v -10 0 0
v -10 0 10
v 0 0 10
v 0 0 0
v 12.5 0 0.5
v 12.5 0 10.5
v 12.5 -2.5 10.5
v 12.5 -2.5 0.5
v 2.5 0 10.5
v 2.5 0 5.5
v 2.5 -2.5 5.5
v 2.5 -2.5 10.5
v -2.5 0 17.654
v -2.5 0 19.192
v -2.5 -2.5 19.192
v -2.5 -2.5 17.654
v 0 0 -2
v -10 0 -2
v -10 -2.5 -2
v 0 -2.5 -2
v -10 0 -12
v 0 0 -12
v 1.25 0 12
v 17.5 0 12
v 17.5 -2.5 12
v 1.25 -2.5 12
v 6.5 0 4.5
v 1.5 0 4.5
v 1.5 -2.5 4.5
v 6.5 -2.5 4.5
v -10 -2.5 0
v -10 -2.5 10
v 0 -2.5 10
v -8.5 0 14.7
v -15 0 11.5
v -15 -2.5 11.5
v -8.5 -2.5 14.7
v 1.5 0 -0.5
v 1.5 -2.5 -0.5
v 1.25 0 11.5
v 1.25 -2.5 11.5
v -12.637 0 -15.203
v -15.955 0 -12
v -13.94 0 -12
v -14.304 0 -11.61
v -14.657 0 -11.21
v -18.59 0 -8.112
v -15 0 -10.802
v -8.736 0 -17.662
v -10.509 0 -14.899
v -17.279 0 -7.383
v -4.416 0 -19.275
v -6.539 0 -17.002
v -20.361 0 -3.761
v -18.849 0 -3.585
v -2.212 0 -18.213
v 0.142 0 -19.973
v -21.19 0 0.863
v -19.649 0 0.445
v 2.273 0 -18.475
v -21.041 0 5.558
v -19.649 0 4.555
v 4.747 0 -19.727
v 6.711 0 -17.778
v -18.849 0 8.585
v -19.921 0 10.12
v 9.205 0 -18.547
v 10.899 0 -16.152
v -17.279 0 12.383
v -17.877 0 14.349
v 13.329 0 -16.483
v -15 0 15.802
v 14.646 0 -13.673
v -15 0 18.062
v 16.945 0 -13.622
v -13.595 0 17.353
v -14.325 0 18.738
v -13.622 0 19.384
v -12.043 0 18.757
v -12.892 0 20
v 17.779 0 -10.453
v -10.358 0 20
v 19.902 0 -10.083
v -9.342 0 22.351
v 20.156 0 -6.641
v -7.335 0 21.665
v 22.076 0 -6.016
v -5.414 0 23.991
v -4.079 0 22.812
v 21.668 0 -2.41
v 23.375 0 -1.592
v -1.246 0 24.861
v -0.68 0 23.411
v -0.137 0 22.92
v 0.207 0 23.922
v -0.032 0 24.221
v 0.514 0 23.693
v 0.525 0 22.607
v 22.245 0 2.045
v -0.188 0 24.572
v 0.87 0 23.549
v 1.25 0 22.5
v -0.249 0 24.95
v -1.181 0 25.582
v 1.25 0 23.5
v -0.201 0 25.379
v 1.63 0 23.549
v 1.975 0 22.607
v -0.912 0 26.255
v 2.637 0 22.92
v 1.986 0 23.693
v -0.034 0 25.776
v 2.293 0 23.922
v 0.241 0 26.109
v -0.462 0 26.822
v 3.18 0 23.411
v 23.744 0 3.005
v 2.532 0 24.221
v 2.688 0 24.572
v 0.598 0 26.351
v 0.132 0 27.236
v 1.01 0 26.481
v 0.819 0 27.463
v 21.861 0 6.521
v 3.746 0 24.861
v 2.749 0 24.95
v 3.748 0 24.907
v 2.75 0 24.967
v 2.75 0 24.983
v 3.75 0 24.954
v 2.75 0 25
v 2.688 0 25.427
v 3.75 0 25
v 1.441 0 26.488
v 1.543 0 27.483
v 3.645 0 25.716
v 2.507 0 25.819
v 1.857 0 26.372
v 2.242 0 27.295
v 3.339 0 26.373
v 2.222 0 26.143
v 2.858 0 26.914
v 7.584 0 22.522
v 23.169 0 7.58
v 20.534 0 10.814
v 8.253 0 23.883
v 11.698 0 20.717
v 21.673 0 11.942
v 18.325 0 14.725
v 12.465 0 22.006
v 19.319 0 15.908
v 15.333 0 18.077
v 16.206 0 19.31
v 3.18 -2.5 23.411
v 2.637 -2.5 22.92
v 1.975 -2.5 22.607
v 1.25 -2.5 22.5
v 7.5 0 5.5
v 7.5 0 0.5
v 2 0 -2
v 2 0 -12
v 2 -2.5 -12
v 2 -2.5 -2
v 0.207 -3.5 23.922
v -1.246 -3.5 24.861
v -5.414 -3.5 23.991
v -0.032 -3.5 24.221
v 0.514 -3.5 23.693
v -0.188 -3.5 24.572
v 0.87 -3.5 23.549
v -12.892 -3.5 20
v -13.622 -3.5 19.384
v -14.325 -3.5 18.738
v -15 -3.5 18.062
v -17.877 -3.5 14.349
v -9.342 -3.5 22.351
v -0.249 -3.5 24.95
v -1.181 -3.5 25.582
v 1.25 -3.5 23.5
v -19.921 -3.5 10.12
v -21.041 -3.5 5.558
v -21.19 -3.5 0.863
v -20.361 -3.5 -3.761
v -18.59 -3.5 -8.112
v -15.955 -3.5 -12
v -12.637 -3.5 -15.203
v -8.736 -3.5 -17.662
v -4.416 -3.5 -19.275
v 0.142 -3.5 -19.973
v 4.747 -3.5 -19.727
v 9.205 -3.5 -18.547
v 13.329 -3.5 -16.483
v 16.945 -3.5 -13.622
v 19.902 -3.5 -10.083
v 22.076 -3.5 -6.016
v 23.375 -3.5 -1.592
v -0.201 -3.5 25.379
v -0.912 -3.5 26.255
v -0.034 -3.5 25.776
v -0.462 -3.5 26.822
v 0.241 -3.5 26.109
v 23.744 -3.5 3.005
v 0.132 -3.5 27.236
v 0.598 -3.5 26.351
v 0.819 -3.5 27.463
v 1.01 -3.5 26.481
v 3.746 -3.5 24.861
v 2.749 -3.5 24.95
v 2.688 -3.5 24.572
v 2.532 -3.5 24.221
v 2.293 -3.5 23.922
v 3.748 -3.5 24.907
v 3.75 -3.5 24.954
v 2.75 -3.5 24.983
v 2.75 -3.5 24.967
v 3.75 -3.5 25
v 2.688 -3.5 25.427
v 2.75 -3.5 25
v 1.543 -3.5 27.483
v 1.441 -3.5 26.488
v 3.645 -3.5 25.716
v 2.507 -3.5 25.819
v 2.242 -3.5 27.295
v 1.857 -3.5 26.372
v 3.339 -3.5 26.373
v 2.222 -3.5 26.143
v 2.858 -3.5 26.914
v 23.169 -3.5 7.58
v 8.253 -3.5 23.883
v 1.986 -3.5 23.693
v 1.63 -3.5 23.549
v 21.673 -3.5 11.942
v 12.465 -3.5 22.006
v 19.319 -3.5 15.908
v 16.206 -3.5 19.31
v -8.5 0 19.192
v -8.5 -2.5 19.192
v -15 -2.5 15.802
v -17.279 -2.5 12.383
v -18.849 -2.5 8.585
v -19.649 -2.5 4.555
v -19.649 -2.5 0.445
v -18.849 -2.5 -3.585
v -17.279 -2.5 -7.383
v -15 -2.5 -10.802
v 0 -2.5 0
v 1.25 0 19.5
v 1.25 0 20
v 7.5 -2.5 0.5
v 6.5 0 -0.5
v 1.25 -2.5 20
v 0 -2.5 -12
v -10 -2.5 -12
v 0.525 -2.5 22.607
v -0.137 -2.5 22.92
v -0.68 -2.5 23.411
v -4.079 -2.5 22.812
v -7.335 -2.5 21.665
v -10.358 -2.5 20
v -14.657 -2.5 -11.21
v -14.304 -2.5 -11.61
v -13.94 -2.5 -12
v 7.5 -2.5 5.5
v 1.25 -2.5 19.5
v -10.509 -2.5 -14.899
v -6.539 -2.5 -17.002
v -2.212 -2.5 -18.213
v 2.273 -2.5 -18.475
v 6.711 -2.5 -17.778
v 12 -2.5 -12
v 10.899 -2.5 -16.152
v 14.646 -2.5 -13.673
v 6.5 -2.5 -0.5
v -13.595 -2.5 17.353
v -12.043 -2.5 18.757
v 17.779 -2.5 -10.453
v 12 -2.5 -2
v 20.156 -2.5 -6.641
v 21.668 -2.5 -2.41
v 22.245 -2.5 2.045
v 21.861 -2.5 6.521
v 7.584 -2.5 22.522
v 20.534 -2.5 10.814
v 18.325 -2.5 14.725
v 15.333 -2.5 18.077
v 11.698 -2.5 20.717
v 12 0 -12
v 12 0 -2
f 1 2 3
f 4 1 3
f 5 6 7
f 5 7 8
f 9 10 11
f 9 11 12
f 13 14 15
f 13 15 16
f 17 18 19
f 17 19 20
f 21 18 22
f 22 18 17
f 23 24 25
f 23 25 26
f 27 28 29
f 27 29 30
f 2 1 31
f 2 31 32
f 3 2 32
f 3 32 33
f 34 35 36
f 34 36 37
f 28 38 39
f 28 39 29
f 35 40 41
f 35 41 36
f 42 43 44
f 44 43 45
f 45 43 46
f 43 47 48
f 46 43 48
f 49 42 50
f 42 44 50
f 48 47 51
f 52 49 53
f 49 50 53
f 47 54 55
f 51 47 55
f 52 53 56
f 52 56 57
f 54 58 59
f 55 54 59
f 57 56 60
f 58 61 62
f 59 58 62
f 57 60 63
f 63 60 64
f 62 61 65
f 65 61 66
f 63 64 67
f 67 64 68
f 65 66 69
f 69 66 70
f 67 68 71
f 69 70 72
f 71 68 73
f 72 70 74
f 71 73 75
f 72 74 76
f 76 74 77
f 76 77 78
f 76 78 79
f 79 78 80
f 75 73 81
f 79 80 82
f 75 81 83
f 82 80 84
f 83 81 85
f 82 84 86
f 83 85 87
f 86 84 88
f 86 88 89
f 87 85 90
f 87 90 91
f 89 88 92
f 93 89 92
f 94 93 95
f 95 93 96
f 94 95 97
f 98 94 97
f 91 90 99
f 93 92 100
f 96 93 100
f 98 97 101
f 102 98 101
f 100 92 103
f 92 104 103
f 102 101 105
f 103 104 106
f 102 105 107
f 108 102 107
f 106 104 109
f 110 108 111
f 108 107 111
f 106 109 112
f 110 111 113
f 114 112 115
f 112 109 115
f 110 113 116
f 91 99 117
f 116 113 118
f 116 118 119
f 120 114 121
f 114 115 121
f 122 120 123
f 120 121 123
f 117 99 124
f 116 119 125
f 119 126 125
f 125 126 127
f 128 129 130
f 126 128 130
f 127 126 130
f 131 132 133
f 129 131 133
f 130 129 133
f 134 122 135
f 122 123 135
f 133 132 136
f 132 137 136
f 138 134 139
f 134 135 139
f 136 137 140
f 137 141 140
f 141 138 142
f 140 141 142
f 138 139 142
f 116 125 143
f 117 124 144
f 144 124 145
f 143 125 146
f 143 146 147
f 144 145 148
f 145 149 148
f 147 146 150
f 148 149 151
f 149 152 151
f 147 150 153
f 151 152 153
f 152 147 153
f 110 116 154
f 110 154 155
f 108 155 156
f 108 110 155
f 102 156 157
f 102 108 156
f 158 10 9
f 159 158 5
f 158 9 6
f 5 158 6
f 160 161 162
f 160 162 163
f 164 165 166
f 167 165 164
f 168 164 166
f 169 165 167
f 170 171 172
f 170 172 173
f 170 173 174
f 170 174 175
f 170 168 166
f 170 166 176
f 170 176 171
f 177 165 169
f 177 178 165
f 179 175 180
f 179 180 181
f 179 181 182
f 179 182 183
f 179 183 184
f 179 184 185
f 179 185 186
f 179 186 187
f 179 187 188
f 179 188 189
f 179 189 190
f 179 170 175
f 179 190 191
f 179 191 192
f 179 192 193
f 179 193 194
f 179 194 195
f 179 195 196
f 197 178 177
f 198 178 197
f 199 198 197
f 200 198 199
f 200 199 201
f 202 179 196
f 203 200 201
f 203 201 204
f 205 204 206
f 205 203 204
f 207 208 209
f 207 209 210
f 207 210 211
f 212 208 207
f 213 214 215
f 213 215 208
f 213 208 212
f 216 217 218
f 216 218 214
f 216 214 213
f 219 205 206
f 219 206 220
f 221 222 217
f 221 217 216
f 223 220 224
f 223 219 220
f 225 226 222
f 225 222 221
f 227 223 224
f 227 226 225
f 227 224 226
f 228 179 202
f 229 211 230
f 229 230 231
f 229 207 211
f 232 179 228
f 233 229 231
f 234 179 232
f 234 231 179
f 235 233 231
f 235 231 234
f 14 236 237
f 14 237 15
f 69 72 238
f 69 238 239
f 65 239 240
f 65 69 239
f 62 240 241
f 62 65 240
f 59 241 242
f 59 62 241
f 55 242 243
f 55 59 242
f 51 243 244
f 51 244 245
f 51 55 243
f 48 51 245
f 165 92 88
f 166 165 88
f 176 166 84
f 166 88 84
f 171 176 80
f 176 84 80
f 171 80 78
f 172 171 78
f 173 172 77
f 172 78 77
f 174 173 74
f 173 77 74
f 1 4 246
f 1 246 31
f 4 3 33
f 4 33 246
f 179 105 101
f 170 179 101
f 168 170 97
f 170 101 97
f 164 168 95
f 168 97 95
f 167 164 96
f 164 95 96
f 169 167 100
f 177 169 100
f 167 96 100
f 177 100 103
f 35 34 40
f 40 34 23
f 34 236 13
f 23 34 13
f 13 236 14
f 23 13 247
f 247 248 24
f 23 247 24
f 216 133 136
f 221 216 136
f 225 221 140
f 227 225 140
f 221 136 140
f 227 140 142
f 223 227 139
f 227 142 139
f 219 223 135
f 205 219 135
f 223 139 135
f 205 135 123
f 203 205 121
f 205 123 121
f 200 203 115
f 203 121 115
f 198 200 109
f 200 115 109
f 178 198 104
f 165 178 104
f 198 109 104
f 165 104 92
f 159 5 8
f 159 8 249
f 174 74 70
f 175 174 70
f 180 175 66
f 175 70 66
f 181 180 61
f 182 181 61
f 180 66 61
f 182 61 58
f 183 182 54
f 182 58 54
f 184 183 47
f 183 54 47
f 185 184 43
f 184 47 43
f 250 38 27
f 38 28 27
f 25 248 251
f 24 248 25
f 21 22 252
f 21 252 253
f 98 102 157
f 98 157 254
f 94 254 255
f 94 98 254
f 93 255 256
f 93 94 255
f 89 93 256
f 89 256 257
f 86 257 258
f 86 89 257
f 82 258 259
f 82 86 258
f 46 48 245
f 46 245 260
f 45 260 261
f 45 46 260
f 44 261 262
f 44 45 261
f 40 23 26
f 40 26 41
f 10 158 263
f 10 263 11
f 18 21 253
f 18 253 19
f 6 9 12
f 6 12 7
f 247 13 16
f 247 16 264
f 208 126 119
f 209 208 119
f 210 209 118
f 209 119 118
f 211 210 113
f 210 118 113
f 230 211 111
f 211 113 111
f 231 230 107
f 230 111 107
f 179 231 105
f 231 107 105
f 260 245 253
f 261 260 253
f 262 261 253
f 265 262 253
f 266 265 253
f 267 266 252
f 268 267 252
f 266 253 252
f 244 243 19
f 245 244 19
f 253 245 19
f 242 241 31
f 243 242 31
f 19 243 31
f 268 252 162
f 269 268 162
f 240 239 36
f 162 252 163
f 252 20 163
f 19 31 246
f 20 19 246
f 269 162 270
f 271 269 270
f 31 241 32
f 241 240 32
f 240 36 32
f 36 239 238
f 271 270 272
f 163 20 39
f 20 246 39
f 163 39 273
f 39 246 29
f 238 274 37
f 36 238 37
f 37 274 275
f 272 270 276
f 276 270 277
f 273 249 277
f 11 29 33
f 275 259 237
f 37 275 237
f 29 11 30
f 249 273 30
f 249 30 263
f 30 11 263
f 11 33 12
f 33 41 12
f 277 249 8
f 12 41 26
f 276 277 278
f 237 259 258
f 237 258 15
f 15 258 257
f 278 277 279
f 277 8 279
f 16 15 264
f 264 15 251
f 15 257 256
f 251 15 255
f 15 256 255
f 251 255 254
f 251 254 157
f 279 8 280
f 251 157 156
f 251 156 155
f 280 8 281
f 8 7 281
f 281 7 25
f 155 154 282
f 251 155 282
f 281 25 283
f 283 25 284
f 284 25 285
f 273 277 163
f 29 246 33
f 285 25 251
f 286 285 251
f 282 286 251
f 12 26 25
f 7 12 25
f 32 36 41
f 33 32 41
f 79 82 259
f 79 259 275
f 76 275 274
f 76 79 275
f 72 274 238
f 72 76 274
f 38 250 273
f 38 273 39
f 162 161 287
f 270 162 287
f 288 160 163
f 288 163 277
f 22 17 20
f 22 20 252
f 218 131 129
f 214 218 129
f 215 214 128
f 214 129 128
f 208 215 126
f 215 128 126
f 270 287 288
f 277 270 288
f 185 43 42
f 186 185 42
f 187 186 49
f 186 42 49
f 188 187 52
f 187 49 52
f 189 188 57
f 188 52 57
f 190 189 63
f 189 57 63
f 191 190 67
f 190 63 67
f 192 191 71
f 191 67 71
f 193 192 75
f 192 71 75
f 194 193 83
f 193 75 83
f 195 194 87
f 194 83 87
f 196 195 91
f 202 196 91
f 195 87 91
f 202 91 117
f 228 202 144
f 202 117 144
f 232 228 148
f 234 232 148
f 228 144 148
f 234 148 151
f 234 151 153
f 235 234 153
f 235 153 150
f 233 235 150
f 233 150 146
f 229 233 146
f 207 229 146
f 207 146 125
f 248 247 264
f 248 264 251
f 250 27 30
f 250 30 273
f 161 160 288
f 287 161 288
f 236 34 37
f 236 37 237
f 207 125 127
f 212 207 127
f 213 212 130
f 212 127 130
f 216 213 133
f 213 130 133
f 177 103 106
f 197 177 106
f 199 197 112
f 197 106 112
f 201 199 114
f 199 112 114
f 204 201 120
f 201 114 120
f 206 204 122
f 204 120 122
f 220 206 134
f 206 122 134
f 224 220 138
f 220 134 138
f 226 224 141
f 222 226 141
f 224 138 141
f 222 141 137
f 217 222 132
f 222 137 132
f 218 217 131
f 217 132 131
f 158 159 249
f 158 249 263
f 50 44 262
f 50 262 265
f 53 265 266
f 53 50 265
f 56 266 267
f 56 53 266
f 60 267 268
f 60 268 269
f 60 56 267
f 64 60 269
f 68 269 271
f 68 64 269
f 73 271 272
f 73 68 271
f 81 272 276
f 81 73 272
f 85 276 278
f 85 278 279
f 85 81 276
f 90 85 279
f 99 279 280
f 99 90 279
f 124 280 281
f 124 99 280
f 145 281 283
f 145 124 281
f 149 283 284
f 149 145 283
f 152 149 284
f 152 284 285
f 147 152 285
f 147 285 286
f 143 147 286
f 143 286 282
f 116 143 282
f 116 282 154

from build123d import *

# Parameters (mm, degrees)
F0_W     = 10
F0_H     = 10
F0_W_2   = 5
F0_H_2   = 5
F1_DEPTH = 3.5
F2_DEPTH = 2.5


with BuildPart() as f1:
    # F0 (on Front) → F1 (new body)
    with BuildSketch(Plane.XZ):
        with BuildLine():
            Line((-12.8921356237, 20), (-10.3581867662, 20))
            ThreePointArc((-10.3581867662, 20), (-5.7307218874, 22.3057951603), (-0.6801378445, 23.4111111111))
            ThreePointArc((-0.6801378445, 23.4111111111), (-1.0788638136, 24.0909382102), (-1.2461389938, 24.8611111111))
            ThreePointArc((-1.2461389938, 24.8611111111), (-7.4169282835, 23.2637750452), (-12.8921356237, 20))
        make_face()
        with BuildLine():
            ThreePointArc((3.75, 25), (1.1805287275, 27.499034562), (-1.2461389938, 24.8611111111))
            ThreePointArc((-1.2461389938, 24.8611111111), (-0.7481470607, 24.9111001141), (-0.2491664351, 24.95))
            ThreePointArc((-0.2491664351, 24.95), (1.2249965261, 26.4997915943), (2.75, 25))
            ThreePointArc((2.75, 25), (2.7497915943, 24.9749965261), (2.7491664351, 24.95))
            ThreePointArc((2.7491664351, 24.95), (3.2481470607, 24.9111001141), (3.7461389938, 24.8611111111))
            ThreePointArc((3.7461389938, 24.8611111111), (3.749034562, 24.9305287275), (3.75, 25))
        make_face()
        with BuildLine():
            ThreePointArc((2.7491664351, 24.95), (2.2928326851, 23.9218070715), (1.250000012, 23.5))
            ThreePointArc((1.250000012, 23.5), (2.2160917891, 23.4777660073), (3.1801378445, 23.4111111111))
            ThreePointArc((3.1801378445, 23.4111111111), (3.5788638136, 24.0909382102), (3.7461389938, 24.8611111111))
            ThreePointArc((3.7461389938, 24.8611111111), (3.2481470607, 24.9111001141), (2.7491664351, 24.95))
        make_face()
        with BuildLine():
            ThreePointArc((-1.2461389938, 24.8611111111), (-1.0788638136, 24.0909382102), (-0.6801378445, 23.4111111111))
            ThreePointArc((-0.6801378445, 23.4111111111), (0.2839082229, 23.4777660078), (1.250000012, 23.5))
            ThreePointArc((1.250000012, 23.5), (0.2071673236, 23.9218070632), (-0.2491664351, 24.95))
            ThreePointArc((-0.2491664351, 24.95), (-0.7481470607, 24.9111001141), (-1.2461389938, 24.8611111111))
        make_face()
        with BuildLine():
            ThreePointArc((1.250000012, 23.5), (0.2839082229, 23.4777660078), (-0.6801378445, 23.4111111111))
            ThreePointArc((-0.6801378445, 23.4111111111), (0.1828126271, 22.739223339), (1.25, 22.5))
            Line((1.25, 22.5), (1.25, 23.5))
        make_face()
        with BuildLine():
            Line((1.25, 23.5), (1.25, 22.5))
            ThreePointArc((1.25, 22.5), (2.3171873729, 22.739223339), (3.1801378445, 23.4111111111))
            ThreePointArc((3.1801378445, 23.4111111111), (2.2160917891, 23.4777660073), (1.250000012, 23.5))
        make_face()
        with BuildLine():
            ThreePointArc((-0.6801378445, 23.4111111111), (-5.7307218874, 22.3057951603), (-10.3581867662, 20))
            Line((-10.3581867662, 20), (1.25, 20))
            Line((1.25, 20), (1.25, 22.5))
            ThreePointArc((1.25, 22.5), (0.1828126271, 22.739223339), (-0.6801378445, 23.4111111111))
        make_face()
        with BuildLine():
            Line((2, -2), (0, -2))
            Line((0, -2), (0, -12))
            Line((0, -12), (-10, -12))
            Line((-10, -12), (-13.940457531, -12))
            ThreePointArc((-13.940457531, -12), (9.0602622187, -16.9935836643), (22.25, 2.5))
            ThreePointArc((22.25, 2.5), (16.7666506491, 16.650390547), (3.1801378445, 23.4111111111))
            ThreePointArc((3.1801378445, 23.4111111111), (2.3171873729, 22.739223339), (1.25, 22.5))
            Line((1.25, 22.5), (1.25, 20))
            Line((1.25, 20), (17.5, 12))
            Line((17.5, 12), (2.5, 12))
            Line((2.5, 12), (2.5, 10.5))
            Line((2.5, 10.5), (7.5, 10.5))
            Line((7.5, 10.5), (12.5, 10.5))
            Line((12.5, 10.5), (12.5, 5.5))
            Line((12.5, 5.5), (12.5, 0.5))
            Line((12.5, 0.5), (7.5, 0.5))
            Line((7.5, 0.5), (7.5, 4.5))
            Line((7.5, 4.5), (6.5, 4.5))
            Line((6.5, 4.5), (6.5, -0.5))
            Line((6.5, -0.5), (2, -0.5))
            Line((2, -0.5), (2, -2))
        make_face()
        with Locations((7, -7)):
            Rectangle(F0_W, F0_H, mode=Mode.SUBTRACT)
        with BuildLine():
            ThreePointArc((22.25, 2.5), (9.0602622187, -16.9935836643), (-13.940457531, -12))
            Line((-13.940457531, -12), (-15, -12))
            Line((-15, -12), (-15.9546505341, -12))
            ThreePointArc((-15.9546505341, -12), (8.9683341138, -18.6347419788), (23.75, 2.5))
            ThreePointArc((23.75, 2.5), (18.0192147604, 17.5014478074), (3.7461389938, 24.8611111111))
            ThreePointArc((3.7461389938, 24.8611111111), (3.5788638136, 24.0909382102), (3.1801378445, 23.4111111111))
            ThreePointArc((3.1801378445, 23.4111111111), (16.7666506491, 16.650390547), (22.25, 2.5))
        make_face()
        Polygon((-15, 11.5), (0, 11.5), (1.25, 11.5), (1.25, 12), (1.25, 19.5), (-2.5, 17.6538461538), (-8.5, 14.7), align=None)
        Polygon((1.25, 19.5), (1.25, 12), (2.5, 12), (17.5, 12), (1.25, 20), align=None)
        with Locations((5, 8)):
            Rectangle(F0_W_2, F0_H_2)
        with Locations((10, 8)):
            Rectangle(F0_W_2, F0_H_2)
        Polygon((7.5, 5.5), (7.5, 4.5), (7.5, 0.5), (12.5, 0.5), (12.5, 5.5), align=None)
        Polygon((1.5, 4.5), (1.5, 0), (1.5, -0.5), (2, -0.5), (6.5, -0.5), (6.5, 4.5), align=None)
        Polygon((0, 10), (0, 0), (1.5, 0), (1.5, 4.5), (6.5, 4.5), (7.5, 4.5), (7.5, 5.5), (2.5, 5.5), (2.5, 10.5), (2.5, 12), (1.25, 12), (1.25, 11.5), (0, 11.5), align=None)
        Polygon((1.5, 0), (0, 0), (0, -1), (0, -2), (2, -2), (2, -0.5), (1.5, -0.5), align=None)
        with Locations((7, -7)):
            Rectangle(F0_W, F0_H)
        with Locations((-5, -7)):
            Rectangle(F0_W, F0_H)
        with BuildLine():
            Line((0, -1), (0, 0))
            Line((0, 0), (-10, 0))
            Line((-10, 0), (-10, 10))
            Line((-10, 10), (-7.5, 10))
            Line((-7.5, 10), (0, 10))
            Line((0, 10), (0, 11.5))
            Line((0, 11.5), (-15, 11.5))
            Line((-15, 11.5), (-15, 4))
            Line((-15, 4), (-15, -10.8017855944))
            ThreePointArc((-15, -10.8017855944), (-14.4816407879, -11.4109840817), (-13.940457531, -12))
            Line((-13.940457531, -12), (-10, -12))
            Line((-10, -12), (-10, -2))
            Line((-10, -2), (0, -2))
            Line((0, -2), (0, -1))
        make_face()
        Polygon((-10, 0), (0, 0), (0, 10), (-7.5, 10), (-10, 10), align=None)
        with BuildLine():
            Line((-15, 15.8017855944), (-15, 11.5))
            Line((-15, 11.5), (-8.5, 14.7))
            Line((-8.5, 14.7), (-8.5, 19.1923076923))
            Line((-8.5, 19.1923076923), (-2.5, 19.1923076923))
            Line((-2.5, 19.1923076923), (-2.5, 17.6538461538))
            Line((-2.5, 17.6538461538), (1.25, 19.5))
            Line((1.25, 19.5), (1.25, 20))
            Line((1.25, 20), (-10.3581867662, 20))
            ThreePointArc((-10.3581867662, 20), (-12.8363726177, 18.0747907362), (-15, 15.8017855944))
        make_face()
        Polygon((-8.5, 19.1923076923), (-8.5, 14.7), (-2.5, 17.6538461538), (-2.5, 19.1923076923), align=None)
        with BuildLine():
            Line((-15, 18.0623744975), (-15, 15.8017855944))
            ThreePointArc((-15, 15.8017855944), (-12.8363726177, 18.0747907362), (-10.3581867662, 20))
            Line((-10.3581867662, 20), (-12.8921356237, 20))
            ThreePointArc((-12.8921356237, 20), (-13.9769194222, 19.0647494672), (-15, 18.0623744975))
        make_face()
        with BuildLine():
            ThreePointArc((-15, -10.8017855944), (-19.75, 2.5), (-15, 15.8017855944))
            Line((-15, 15.8017855944), (-15, 18.0623744975))
            ThreePointArc((-15, 18.0623744975), (-21.2386638264, 3.2141423554), (-15.9546505341, -12))
            Line((-15.9546505341, -12), (-15, -12))
            Line((-15, -12), (-15, -10.8017855944))
        make_face()
        with BuildLine():
            Line((-15, 4), (-15, 11.5))
            Line((-15, 11.5), (-15, 15.8017855944))
            ThreePointArc((-15, 15.8017855944), (-19.75, 2.5), (-15, -10.8017855944))
            Line((-15, -10.8017855944), (-15, 4))
        make_face()
        with BuildLine():
            ThreePointArc((-13.940457531, -12), (-14.4816407879, -11.4109840817), (-15, -10.8017855944))
            Line((-15, -10.8017855944), (-15, -12))
            Line((-15, -12), (-13.940457531, -12))
        make_face()
    extrude(amount=F1_DEPTH)

    # F0 (on Front) → F2 (cut)
    with BuildSketch(Plane.XZ):
        with BuildLine():
            Line((2, -2), (0, -2))
            Line((0, -2), (0, -12))
            Line((0, -12), (-10, -12))
            Line((-10, -12), (-13.940457531, -12))
            ThreePointArc((-13.940457531, -12), (9.0602622187, -16.9935836643), (22.25, 2.5))
            ThreePointArc((22.25, 2.5), (16.7666506491, 16.650390547), (3.1801378445, 23.4111111111))
            ThreePointArc((3.1801378445, 23.4111111111), (2.3171873729, 22.739223339), (1.25, 22.5))
            Line((1.25, 22.5), (1.25, 20))
            Line((1.25, 20), (17.5, 12))
            Line((17.5, 12), (2.5, 12))
            Line((2.5, 12), (2.5, 10.5))
            Line((2.5, 10.5), (7.5, 10.5))
            Line((7.5, 10.5), (12.5, 10.5))
            Line((12.5, 10.5), (12.5, 5.5))
            Line((12.5, 5.5), (12.5, 0.5))
            Line((12.5, 0.5), (7.5, 0.5))
            Line((7.5, 0.5), (7.5, 4.5))
            Line((7.5, 4.5), (6.5, 4.5))
            Line((6.5, 4.5), (6.5, -0.5))
            Line((6.5, -0.5), (2, -0.5))
            Line((2, -0.5), (2, -2))
        make_face()
        with Locations((7, -7)):
            Rectangle(F0_W, F0_H, mode=Mode.SUBTRACT)
        Polygon((0, 10), (0, 0), (1.5, 0), (1.5, 4.5), (6.5, 4.5), (7.5, 4.5), (7.5, 5.5), (2.5, 5.5), (2.5, 10.5), (2.5, 12), (1.25, 12), (1.25, 11.5), (0, 11.5), align=None)
        Polygon((1.5, 0), (0, 0), (0, -1), (0, -2), (2, -2), (2, -0.5), (1.5, -0.5), align=None)
        with BuildLine():
            Line((0, -1), (0, 0))
            Line((0, 0), (-10, 0))
            Line((-10, 0), (-10, 10))
            Line((-10, 10), (-7.5, 10))
            Line((-7.5, 10), (0, 10))
            Line((0, 10), (0, 11.5))
            Line((0, 11.5), (-15, 11.5))
            Line((-15, 11.5), (-15, 4))
            Line((-15, 4), (-15, -10.8017855944))
            ThreePointArc((-15, -10.8017855944), (-14.4816407879, -11.4109840817), (-13.940457531, -12))
            Line((-13.940457531, -12), (-10, -12))
            Line((-10, -12), (-10, -2))
            Line((-10, -2), (0, -2))
            Line((0, -2), (0, -1))
        make_face()
        with BuildLine():
            Line((-15, 4), (-15, 11.5))
            Line((-15, 11.5), (-15, 15.8017855944))
            ThreePointArc((-15, 15.8017855944), (-19.75, 2.5), (-15, -10.8017855944))
            Line((-15, -10.8017855944), (-15, 4))
        make_face()
        with BuildLine():
            Line((-15, 15.8017855944), (-15, 11.5))
            Line((-15, 11.5), (-8.5, 14.7))
            Line((-8.5, 14.7), (-8.5, 19.1923076923))
            Line((-8.5, 19.1923076923), (-2.5, 19.1923076923))
            Line((-2.5, 19.1923076923), (-2.5, 17.6538461538))
            Line((-2.5, 17.6538461538), (1.25, 19.5))
            Line((1.25, 19.5), (1.25, 20))
            Line((1.25, 20), (-10.3581867662, 20))
            ThreePointArc((-10.3581867662, 20), (-12.8363726177, 18.0747907362), (-15, 15.8017855944))
        make_face()
        with BuildLine():
            ThreePointArc((-0.6801378445, 23.4111111111), (-5.7307218874, 22.3057951603), (-10.3581867662, 20))
            Line((-10.3581867662, 20), (1.25, 20))
            Line((1.25, 20), (1.25, 22.5))
            ThreePointArc((1.25, 22.5), (0.1828126271, 22.739223339), (-0.6801378445, 23.4111111111))
        make_face()
    extrude(amount=F2_DEPTH, mode=Mode.SUBTRACT)


solid = f1.part
